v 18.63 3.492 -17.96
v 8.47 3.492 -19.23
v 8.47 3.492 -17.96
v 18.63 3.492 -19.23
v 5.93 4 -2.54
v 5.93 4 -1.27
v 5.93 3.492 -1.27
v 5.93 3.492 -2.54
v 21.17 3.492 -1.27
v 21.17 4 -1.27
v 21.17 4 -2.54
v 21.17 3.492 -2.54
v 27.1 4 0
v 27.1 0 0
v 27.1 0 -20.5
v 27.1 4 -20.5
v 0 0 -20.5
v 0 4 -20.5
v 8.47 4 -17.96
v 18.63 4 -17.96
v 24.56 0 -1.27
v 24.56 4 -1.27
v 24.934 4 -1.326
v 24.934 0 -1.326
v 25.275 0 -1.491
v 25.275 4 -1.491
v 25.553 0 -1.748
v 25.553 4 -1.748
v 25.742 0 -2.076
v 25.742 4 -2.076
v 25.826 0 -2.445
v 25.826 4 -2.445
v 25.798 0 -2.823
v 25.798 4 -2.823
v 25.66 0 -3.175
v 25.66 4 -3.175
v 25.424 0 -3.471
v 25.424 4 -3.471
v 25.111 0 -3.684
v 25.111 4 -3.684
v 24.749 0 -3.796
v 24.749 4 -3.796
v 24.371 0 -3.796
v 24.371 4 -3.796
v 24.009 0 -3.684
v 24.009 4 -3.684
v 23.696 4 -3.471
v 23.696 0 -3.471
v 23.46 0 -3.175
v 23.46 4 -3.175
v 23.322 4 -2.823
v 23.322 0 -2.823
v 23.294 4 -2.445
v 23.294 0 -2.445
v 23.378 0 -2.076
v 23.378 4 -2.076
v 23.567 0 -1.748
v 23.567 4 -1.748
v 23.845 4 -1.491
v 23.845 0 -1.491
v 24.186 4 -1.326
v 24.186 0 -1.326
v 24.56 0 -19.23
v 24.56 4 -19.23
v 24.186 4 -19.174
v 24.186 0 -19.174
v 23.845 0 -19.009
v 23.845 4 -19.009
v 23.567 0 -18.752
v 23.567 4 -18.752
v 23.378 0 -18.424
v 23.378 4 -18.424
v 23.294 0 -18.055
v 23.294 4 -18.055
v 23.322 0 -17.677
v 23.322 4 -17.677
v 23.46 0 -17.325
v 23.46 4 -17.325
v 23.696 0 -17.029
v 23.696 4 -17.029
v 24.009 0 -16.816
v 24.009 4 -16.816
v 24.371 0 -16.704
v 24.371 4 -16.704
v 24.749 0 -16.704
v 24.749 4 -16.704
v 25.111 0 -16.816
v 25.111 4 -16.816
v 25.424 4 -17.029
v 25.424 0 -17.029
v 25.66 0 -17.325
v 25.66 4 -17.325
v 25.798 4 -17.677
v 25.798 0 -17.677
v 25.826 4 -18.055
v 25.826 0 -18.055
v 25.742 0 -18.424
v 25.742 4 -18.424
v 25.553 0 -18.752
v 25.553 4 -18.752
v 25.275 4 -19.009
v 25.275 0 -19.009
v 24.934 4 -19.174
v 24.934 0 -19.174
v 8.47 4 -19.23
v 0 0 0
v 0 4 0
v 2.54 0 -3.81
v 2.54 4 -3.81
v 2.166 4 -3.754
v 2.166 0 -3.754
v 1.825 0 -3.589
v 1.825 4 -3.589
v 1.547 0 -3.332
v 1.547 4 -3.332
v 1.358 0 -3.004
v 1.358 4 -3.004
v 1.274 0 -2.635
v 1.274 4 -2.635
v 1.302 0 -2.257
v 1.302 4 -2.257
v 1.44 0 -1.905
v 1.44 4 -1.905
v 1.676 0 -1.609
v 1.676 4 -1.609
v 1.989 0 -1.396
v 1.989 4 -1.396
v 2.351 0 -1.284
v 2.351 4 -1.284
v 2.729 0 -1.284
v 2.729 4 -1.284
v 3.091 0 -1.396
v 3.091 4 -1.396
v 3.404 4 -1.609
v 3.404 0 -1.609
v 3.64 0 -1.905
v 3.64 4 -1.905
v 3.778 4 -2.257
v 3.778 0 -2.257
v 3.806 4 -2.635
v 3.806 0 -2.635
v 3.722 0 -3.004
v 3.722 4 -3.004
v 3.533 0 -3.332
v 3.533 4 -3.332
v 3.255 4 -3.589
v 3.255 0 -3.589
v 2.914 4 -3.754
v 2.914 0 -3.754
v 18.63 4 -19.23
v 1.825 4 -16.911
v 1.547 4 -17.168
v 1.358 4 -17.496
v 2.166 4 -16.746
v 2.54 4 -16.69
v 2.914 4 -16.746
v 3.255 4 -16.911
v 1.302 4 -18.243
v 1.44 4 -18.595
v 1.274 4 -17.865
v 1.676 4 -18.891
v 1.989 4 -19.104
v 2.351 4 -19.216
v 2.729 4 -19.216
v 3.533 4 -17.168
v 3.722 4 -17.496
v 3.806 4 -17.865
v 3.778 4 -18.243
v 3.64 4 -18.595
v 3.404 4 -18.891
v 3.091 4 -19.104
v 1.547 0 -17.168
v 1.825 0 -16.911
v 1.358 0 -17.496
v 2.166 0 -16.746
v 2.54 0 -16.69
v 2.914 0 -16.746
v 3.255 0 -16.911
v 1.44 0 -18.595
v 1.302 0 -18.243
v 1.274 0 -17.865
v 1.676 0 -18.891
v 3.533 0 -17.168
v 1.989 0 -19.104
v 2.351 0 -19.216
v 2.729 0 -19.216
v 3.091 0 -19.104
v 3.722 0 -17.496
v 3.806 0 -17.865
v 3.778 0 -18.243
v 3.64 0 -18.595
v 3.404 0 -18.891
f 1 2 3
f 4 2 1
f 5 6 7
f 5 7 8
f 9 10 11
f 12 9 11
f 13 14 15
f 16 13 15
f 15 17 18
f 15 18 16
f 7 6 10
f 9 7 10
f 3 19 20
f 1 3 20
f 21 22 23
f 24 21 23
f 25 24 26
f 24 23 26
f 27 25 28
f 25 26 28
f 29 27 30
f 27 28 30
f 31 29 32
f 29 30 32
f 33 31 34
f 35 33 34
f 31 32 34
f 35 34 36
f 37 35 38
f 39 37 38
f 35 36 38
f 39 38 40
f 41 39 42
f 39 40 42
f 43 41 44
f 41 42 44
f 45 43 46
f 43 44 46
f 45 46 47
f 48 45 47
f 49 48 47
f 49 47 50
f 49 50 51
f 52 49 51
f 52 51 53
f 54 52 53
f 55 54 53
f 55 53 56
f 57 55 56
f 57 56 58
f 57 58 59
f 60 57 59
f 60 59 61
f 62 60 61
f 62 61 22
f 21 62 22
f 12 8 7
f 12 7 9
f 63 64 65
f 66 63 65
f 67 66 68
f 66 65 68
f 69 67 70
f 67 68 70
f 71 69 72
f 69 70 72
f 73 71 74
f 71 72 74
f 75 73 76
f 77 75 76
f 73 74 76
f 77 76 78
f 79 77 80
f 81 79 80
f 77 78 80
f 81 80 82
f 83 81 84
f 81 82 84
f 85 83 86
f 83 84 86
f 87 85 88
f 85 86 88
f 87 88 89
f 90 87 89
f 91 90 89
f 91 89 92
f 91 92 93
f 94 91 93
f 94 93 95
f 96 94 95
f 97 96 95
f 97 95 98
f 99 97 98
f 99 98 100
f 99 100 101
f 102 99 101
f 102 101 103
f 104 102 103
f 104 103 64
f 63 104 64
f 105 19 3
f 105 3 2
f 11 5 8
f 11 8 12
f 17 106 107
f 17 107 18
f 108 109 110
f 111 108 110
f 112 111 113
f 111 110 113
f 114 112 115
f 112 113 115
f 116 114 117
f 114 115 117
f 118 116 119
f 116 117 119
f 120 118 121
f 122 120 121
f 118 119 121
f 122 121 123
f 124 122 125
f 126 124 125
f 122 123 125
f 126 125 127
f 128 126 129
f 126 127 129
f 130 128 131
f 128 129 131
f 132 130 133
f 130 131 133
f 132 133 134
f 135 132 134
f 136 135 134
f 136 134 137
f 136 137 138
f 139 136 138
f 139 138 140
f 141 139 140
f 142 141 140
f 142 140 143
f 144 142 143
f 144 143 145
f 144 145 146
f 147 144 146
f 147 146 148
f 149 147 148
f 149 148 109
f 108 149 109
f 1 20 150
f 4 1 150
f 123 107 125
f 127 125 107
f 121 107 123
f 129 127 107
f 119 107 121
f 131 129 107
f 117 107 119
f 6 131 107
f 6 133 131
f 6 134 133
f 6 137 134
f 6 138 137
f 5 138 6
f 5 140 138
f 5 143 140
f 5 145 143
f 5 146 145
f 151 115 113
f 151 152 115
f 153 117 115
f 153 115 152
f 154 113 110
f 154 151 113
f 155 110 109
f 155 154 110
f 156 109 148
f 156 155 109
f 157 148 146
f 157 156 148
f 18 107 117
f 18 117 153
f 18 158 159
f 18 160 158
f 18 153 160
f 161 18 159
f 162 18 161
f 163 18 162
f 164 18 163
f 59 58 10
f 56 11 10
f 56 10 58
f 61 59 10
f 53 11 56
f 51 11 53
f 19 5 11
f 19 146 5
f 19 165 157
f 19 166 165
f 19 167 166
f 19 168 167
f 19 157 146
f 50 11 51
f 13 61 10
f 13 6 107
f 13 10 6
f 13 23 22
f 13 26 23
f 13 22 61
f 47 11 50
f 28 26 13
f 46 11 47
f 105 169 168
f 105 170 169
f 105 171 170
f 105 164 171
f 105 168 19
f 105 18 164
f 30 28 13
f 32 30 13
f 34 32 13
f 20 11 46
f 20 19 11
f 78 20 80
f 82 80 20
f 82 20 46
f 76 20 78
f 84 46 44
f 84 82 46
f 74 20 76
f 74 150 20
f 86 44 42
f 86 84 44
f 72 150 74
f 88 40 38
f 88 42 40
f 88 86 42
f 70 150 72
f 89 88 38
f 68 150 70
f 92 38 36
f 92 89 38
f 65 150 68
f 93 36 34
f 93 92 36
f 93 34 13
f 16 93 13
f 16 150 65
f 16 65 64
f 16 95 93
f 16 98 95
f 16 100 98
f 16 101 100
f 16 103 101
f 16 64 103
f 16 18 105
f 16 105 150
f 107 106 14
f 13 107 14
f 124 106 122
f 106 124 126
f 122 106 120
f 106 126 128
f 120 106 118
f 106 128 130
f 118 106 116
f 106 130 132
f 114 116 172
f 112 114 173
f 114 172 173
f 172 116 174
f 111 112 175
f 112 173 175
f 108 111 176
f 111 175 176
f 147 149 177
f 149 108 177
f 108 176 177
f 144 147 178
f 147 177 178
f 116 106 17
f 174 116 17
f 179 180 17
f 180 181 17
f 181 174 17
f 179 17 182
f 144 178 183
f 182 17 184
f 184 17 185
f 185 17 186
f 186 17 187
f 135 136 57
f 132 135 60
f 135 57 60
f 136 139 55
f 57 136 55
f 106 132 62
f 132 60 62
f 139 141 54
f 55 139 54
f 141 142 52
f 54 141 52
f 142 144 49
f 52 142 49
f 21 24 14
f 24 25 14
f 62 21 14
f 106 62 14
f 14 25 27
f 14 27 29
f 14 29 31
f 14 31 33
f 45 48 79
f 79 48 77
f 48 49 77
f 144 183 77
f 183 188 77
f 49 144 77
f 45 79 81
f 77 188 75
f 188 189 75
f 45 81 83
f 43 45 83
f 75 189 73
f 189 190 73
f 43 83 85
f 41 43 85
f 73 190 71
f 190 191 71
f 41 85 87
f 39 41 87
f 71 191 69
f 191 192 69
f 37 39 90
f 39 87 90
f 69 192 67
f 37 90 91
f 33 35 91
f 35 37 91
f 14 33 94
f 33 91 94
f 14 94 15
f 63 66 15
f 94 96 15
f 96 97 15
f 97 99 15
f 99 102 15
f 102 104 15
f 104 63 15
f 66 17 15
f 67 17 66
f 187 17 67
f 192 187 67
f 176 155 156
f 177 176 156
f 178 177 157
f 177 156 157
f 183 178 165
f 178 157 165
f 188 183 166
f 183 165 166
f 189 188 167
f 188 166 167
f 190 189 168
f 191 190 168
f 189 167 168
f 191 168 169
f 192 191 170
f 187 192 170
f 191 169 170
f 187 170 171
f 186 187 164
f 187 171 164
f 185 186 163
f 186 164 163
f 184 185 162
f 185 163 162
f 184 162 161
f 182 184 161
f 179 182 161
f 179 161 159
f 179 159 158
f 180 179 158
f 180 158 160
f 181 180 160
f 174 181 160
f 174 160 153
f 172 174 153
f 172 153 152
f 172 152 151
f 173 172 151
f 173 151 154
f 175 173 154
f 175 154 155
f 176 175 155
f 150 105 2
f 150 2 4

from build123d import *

# Parameters (mm, degrees)
SKETCH1_W           = 27.1
SKETCH1_H           = 20.5
BOSS_EXTRUDE1_DEPTH = 4
SKETCH3_R           = 1.27
CUT_EXTRUDE1_DEPTH  = 35.214909031
SKETCH2_W           = 10.16
SKETCH2_H           = 1.27
SKETCH2_W_2         = 15.24
CUT_EXTRUDE2_DEPTH  = 0.508


with BuildPart() as part:
    # Sketch1 → Boss-Extrude1 (new body)
    with BuildSketch(Plane(origin=(0, 0, 0), x_dir=(1, 0, 0), z_dir=(0, 1, 0))):
        with Locations((13.55, 10.25)):
            Rectangle(SKETCH1_W, SKETCH1_H)
    extrude(amount=BOSS_EXTRUDE1_DEPTH)

    # Sketch3 → Cut-Extrude1 (cut, through all)
    with BuildSketch(Plane(origin=(0, 4, 0), x_dir=(1, 0, 0), z_dir=(0, 1, 0))):
        with Locations(Location((2.54, 17.96, 0), (0, 0, 270))):
            Circle(SKETCH3_R)
        with Locations(Location((2.54, 2.54, 0), (0, 0, 90))):
            Circle(SKETCH3_R)
        with Locations(Location((24.56, 2.54, 0), (0, 0, 270))):
            Circle(SKETCH3_R)
        with Locations(Location((24.56, 17.96, 0), (0, 0, 90))):
            Circle(SKETCH3_R)
    extrude(amount=-CUT_EXTRUDE1_DEPTH, mode=Mode.SUBTRACT)

    # Sketch2 → Cut-Extrude2 (cut)
    with BuildSketch(Plane(origin=(0, 4, 0), x_dir=(1, 0, 0), z_dir=(0, 1, 0))):
        with Locations((13.55, 18.595)):
            Rectangle(SKETCH2_W, SKETCH2_H)
        with Locations((13.55, 1.905)):
            Rectangle(SKETCH2_W_2, SKETCH2_H)
    extrude(amount=-CUT_EXTRUDE2_DEPTH, mode=Mode.SUBTRACT)


solid = part.part
